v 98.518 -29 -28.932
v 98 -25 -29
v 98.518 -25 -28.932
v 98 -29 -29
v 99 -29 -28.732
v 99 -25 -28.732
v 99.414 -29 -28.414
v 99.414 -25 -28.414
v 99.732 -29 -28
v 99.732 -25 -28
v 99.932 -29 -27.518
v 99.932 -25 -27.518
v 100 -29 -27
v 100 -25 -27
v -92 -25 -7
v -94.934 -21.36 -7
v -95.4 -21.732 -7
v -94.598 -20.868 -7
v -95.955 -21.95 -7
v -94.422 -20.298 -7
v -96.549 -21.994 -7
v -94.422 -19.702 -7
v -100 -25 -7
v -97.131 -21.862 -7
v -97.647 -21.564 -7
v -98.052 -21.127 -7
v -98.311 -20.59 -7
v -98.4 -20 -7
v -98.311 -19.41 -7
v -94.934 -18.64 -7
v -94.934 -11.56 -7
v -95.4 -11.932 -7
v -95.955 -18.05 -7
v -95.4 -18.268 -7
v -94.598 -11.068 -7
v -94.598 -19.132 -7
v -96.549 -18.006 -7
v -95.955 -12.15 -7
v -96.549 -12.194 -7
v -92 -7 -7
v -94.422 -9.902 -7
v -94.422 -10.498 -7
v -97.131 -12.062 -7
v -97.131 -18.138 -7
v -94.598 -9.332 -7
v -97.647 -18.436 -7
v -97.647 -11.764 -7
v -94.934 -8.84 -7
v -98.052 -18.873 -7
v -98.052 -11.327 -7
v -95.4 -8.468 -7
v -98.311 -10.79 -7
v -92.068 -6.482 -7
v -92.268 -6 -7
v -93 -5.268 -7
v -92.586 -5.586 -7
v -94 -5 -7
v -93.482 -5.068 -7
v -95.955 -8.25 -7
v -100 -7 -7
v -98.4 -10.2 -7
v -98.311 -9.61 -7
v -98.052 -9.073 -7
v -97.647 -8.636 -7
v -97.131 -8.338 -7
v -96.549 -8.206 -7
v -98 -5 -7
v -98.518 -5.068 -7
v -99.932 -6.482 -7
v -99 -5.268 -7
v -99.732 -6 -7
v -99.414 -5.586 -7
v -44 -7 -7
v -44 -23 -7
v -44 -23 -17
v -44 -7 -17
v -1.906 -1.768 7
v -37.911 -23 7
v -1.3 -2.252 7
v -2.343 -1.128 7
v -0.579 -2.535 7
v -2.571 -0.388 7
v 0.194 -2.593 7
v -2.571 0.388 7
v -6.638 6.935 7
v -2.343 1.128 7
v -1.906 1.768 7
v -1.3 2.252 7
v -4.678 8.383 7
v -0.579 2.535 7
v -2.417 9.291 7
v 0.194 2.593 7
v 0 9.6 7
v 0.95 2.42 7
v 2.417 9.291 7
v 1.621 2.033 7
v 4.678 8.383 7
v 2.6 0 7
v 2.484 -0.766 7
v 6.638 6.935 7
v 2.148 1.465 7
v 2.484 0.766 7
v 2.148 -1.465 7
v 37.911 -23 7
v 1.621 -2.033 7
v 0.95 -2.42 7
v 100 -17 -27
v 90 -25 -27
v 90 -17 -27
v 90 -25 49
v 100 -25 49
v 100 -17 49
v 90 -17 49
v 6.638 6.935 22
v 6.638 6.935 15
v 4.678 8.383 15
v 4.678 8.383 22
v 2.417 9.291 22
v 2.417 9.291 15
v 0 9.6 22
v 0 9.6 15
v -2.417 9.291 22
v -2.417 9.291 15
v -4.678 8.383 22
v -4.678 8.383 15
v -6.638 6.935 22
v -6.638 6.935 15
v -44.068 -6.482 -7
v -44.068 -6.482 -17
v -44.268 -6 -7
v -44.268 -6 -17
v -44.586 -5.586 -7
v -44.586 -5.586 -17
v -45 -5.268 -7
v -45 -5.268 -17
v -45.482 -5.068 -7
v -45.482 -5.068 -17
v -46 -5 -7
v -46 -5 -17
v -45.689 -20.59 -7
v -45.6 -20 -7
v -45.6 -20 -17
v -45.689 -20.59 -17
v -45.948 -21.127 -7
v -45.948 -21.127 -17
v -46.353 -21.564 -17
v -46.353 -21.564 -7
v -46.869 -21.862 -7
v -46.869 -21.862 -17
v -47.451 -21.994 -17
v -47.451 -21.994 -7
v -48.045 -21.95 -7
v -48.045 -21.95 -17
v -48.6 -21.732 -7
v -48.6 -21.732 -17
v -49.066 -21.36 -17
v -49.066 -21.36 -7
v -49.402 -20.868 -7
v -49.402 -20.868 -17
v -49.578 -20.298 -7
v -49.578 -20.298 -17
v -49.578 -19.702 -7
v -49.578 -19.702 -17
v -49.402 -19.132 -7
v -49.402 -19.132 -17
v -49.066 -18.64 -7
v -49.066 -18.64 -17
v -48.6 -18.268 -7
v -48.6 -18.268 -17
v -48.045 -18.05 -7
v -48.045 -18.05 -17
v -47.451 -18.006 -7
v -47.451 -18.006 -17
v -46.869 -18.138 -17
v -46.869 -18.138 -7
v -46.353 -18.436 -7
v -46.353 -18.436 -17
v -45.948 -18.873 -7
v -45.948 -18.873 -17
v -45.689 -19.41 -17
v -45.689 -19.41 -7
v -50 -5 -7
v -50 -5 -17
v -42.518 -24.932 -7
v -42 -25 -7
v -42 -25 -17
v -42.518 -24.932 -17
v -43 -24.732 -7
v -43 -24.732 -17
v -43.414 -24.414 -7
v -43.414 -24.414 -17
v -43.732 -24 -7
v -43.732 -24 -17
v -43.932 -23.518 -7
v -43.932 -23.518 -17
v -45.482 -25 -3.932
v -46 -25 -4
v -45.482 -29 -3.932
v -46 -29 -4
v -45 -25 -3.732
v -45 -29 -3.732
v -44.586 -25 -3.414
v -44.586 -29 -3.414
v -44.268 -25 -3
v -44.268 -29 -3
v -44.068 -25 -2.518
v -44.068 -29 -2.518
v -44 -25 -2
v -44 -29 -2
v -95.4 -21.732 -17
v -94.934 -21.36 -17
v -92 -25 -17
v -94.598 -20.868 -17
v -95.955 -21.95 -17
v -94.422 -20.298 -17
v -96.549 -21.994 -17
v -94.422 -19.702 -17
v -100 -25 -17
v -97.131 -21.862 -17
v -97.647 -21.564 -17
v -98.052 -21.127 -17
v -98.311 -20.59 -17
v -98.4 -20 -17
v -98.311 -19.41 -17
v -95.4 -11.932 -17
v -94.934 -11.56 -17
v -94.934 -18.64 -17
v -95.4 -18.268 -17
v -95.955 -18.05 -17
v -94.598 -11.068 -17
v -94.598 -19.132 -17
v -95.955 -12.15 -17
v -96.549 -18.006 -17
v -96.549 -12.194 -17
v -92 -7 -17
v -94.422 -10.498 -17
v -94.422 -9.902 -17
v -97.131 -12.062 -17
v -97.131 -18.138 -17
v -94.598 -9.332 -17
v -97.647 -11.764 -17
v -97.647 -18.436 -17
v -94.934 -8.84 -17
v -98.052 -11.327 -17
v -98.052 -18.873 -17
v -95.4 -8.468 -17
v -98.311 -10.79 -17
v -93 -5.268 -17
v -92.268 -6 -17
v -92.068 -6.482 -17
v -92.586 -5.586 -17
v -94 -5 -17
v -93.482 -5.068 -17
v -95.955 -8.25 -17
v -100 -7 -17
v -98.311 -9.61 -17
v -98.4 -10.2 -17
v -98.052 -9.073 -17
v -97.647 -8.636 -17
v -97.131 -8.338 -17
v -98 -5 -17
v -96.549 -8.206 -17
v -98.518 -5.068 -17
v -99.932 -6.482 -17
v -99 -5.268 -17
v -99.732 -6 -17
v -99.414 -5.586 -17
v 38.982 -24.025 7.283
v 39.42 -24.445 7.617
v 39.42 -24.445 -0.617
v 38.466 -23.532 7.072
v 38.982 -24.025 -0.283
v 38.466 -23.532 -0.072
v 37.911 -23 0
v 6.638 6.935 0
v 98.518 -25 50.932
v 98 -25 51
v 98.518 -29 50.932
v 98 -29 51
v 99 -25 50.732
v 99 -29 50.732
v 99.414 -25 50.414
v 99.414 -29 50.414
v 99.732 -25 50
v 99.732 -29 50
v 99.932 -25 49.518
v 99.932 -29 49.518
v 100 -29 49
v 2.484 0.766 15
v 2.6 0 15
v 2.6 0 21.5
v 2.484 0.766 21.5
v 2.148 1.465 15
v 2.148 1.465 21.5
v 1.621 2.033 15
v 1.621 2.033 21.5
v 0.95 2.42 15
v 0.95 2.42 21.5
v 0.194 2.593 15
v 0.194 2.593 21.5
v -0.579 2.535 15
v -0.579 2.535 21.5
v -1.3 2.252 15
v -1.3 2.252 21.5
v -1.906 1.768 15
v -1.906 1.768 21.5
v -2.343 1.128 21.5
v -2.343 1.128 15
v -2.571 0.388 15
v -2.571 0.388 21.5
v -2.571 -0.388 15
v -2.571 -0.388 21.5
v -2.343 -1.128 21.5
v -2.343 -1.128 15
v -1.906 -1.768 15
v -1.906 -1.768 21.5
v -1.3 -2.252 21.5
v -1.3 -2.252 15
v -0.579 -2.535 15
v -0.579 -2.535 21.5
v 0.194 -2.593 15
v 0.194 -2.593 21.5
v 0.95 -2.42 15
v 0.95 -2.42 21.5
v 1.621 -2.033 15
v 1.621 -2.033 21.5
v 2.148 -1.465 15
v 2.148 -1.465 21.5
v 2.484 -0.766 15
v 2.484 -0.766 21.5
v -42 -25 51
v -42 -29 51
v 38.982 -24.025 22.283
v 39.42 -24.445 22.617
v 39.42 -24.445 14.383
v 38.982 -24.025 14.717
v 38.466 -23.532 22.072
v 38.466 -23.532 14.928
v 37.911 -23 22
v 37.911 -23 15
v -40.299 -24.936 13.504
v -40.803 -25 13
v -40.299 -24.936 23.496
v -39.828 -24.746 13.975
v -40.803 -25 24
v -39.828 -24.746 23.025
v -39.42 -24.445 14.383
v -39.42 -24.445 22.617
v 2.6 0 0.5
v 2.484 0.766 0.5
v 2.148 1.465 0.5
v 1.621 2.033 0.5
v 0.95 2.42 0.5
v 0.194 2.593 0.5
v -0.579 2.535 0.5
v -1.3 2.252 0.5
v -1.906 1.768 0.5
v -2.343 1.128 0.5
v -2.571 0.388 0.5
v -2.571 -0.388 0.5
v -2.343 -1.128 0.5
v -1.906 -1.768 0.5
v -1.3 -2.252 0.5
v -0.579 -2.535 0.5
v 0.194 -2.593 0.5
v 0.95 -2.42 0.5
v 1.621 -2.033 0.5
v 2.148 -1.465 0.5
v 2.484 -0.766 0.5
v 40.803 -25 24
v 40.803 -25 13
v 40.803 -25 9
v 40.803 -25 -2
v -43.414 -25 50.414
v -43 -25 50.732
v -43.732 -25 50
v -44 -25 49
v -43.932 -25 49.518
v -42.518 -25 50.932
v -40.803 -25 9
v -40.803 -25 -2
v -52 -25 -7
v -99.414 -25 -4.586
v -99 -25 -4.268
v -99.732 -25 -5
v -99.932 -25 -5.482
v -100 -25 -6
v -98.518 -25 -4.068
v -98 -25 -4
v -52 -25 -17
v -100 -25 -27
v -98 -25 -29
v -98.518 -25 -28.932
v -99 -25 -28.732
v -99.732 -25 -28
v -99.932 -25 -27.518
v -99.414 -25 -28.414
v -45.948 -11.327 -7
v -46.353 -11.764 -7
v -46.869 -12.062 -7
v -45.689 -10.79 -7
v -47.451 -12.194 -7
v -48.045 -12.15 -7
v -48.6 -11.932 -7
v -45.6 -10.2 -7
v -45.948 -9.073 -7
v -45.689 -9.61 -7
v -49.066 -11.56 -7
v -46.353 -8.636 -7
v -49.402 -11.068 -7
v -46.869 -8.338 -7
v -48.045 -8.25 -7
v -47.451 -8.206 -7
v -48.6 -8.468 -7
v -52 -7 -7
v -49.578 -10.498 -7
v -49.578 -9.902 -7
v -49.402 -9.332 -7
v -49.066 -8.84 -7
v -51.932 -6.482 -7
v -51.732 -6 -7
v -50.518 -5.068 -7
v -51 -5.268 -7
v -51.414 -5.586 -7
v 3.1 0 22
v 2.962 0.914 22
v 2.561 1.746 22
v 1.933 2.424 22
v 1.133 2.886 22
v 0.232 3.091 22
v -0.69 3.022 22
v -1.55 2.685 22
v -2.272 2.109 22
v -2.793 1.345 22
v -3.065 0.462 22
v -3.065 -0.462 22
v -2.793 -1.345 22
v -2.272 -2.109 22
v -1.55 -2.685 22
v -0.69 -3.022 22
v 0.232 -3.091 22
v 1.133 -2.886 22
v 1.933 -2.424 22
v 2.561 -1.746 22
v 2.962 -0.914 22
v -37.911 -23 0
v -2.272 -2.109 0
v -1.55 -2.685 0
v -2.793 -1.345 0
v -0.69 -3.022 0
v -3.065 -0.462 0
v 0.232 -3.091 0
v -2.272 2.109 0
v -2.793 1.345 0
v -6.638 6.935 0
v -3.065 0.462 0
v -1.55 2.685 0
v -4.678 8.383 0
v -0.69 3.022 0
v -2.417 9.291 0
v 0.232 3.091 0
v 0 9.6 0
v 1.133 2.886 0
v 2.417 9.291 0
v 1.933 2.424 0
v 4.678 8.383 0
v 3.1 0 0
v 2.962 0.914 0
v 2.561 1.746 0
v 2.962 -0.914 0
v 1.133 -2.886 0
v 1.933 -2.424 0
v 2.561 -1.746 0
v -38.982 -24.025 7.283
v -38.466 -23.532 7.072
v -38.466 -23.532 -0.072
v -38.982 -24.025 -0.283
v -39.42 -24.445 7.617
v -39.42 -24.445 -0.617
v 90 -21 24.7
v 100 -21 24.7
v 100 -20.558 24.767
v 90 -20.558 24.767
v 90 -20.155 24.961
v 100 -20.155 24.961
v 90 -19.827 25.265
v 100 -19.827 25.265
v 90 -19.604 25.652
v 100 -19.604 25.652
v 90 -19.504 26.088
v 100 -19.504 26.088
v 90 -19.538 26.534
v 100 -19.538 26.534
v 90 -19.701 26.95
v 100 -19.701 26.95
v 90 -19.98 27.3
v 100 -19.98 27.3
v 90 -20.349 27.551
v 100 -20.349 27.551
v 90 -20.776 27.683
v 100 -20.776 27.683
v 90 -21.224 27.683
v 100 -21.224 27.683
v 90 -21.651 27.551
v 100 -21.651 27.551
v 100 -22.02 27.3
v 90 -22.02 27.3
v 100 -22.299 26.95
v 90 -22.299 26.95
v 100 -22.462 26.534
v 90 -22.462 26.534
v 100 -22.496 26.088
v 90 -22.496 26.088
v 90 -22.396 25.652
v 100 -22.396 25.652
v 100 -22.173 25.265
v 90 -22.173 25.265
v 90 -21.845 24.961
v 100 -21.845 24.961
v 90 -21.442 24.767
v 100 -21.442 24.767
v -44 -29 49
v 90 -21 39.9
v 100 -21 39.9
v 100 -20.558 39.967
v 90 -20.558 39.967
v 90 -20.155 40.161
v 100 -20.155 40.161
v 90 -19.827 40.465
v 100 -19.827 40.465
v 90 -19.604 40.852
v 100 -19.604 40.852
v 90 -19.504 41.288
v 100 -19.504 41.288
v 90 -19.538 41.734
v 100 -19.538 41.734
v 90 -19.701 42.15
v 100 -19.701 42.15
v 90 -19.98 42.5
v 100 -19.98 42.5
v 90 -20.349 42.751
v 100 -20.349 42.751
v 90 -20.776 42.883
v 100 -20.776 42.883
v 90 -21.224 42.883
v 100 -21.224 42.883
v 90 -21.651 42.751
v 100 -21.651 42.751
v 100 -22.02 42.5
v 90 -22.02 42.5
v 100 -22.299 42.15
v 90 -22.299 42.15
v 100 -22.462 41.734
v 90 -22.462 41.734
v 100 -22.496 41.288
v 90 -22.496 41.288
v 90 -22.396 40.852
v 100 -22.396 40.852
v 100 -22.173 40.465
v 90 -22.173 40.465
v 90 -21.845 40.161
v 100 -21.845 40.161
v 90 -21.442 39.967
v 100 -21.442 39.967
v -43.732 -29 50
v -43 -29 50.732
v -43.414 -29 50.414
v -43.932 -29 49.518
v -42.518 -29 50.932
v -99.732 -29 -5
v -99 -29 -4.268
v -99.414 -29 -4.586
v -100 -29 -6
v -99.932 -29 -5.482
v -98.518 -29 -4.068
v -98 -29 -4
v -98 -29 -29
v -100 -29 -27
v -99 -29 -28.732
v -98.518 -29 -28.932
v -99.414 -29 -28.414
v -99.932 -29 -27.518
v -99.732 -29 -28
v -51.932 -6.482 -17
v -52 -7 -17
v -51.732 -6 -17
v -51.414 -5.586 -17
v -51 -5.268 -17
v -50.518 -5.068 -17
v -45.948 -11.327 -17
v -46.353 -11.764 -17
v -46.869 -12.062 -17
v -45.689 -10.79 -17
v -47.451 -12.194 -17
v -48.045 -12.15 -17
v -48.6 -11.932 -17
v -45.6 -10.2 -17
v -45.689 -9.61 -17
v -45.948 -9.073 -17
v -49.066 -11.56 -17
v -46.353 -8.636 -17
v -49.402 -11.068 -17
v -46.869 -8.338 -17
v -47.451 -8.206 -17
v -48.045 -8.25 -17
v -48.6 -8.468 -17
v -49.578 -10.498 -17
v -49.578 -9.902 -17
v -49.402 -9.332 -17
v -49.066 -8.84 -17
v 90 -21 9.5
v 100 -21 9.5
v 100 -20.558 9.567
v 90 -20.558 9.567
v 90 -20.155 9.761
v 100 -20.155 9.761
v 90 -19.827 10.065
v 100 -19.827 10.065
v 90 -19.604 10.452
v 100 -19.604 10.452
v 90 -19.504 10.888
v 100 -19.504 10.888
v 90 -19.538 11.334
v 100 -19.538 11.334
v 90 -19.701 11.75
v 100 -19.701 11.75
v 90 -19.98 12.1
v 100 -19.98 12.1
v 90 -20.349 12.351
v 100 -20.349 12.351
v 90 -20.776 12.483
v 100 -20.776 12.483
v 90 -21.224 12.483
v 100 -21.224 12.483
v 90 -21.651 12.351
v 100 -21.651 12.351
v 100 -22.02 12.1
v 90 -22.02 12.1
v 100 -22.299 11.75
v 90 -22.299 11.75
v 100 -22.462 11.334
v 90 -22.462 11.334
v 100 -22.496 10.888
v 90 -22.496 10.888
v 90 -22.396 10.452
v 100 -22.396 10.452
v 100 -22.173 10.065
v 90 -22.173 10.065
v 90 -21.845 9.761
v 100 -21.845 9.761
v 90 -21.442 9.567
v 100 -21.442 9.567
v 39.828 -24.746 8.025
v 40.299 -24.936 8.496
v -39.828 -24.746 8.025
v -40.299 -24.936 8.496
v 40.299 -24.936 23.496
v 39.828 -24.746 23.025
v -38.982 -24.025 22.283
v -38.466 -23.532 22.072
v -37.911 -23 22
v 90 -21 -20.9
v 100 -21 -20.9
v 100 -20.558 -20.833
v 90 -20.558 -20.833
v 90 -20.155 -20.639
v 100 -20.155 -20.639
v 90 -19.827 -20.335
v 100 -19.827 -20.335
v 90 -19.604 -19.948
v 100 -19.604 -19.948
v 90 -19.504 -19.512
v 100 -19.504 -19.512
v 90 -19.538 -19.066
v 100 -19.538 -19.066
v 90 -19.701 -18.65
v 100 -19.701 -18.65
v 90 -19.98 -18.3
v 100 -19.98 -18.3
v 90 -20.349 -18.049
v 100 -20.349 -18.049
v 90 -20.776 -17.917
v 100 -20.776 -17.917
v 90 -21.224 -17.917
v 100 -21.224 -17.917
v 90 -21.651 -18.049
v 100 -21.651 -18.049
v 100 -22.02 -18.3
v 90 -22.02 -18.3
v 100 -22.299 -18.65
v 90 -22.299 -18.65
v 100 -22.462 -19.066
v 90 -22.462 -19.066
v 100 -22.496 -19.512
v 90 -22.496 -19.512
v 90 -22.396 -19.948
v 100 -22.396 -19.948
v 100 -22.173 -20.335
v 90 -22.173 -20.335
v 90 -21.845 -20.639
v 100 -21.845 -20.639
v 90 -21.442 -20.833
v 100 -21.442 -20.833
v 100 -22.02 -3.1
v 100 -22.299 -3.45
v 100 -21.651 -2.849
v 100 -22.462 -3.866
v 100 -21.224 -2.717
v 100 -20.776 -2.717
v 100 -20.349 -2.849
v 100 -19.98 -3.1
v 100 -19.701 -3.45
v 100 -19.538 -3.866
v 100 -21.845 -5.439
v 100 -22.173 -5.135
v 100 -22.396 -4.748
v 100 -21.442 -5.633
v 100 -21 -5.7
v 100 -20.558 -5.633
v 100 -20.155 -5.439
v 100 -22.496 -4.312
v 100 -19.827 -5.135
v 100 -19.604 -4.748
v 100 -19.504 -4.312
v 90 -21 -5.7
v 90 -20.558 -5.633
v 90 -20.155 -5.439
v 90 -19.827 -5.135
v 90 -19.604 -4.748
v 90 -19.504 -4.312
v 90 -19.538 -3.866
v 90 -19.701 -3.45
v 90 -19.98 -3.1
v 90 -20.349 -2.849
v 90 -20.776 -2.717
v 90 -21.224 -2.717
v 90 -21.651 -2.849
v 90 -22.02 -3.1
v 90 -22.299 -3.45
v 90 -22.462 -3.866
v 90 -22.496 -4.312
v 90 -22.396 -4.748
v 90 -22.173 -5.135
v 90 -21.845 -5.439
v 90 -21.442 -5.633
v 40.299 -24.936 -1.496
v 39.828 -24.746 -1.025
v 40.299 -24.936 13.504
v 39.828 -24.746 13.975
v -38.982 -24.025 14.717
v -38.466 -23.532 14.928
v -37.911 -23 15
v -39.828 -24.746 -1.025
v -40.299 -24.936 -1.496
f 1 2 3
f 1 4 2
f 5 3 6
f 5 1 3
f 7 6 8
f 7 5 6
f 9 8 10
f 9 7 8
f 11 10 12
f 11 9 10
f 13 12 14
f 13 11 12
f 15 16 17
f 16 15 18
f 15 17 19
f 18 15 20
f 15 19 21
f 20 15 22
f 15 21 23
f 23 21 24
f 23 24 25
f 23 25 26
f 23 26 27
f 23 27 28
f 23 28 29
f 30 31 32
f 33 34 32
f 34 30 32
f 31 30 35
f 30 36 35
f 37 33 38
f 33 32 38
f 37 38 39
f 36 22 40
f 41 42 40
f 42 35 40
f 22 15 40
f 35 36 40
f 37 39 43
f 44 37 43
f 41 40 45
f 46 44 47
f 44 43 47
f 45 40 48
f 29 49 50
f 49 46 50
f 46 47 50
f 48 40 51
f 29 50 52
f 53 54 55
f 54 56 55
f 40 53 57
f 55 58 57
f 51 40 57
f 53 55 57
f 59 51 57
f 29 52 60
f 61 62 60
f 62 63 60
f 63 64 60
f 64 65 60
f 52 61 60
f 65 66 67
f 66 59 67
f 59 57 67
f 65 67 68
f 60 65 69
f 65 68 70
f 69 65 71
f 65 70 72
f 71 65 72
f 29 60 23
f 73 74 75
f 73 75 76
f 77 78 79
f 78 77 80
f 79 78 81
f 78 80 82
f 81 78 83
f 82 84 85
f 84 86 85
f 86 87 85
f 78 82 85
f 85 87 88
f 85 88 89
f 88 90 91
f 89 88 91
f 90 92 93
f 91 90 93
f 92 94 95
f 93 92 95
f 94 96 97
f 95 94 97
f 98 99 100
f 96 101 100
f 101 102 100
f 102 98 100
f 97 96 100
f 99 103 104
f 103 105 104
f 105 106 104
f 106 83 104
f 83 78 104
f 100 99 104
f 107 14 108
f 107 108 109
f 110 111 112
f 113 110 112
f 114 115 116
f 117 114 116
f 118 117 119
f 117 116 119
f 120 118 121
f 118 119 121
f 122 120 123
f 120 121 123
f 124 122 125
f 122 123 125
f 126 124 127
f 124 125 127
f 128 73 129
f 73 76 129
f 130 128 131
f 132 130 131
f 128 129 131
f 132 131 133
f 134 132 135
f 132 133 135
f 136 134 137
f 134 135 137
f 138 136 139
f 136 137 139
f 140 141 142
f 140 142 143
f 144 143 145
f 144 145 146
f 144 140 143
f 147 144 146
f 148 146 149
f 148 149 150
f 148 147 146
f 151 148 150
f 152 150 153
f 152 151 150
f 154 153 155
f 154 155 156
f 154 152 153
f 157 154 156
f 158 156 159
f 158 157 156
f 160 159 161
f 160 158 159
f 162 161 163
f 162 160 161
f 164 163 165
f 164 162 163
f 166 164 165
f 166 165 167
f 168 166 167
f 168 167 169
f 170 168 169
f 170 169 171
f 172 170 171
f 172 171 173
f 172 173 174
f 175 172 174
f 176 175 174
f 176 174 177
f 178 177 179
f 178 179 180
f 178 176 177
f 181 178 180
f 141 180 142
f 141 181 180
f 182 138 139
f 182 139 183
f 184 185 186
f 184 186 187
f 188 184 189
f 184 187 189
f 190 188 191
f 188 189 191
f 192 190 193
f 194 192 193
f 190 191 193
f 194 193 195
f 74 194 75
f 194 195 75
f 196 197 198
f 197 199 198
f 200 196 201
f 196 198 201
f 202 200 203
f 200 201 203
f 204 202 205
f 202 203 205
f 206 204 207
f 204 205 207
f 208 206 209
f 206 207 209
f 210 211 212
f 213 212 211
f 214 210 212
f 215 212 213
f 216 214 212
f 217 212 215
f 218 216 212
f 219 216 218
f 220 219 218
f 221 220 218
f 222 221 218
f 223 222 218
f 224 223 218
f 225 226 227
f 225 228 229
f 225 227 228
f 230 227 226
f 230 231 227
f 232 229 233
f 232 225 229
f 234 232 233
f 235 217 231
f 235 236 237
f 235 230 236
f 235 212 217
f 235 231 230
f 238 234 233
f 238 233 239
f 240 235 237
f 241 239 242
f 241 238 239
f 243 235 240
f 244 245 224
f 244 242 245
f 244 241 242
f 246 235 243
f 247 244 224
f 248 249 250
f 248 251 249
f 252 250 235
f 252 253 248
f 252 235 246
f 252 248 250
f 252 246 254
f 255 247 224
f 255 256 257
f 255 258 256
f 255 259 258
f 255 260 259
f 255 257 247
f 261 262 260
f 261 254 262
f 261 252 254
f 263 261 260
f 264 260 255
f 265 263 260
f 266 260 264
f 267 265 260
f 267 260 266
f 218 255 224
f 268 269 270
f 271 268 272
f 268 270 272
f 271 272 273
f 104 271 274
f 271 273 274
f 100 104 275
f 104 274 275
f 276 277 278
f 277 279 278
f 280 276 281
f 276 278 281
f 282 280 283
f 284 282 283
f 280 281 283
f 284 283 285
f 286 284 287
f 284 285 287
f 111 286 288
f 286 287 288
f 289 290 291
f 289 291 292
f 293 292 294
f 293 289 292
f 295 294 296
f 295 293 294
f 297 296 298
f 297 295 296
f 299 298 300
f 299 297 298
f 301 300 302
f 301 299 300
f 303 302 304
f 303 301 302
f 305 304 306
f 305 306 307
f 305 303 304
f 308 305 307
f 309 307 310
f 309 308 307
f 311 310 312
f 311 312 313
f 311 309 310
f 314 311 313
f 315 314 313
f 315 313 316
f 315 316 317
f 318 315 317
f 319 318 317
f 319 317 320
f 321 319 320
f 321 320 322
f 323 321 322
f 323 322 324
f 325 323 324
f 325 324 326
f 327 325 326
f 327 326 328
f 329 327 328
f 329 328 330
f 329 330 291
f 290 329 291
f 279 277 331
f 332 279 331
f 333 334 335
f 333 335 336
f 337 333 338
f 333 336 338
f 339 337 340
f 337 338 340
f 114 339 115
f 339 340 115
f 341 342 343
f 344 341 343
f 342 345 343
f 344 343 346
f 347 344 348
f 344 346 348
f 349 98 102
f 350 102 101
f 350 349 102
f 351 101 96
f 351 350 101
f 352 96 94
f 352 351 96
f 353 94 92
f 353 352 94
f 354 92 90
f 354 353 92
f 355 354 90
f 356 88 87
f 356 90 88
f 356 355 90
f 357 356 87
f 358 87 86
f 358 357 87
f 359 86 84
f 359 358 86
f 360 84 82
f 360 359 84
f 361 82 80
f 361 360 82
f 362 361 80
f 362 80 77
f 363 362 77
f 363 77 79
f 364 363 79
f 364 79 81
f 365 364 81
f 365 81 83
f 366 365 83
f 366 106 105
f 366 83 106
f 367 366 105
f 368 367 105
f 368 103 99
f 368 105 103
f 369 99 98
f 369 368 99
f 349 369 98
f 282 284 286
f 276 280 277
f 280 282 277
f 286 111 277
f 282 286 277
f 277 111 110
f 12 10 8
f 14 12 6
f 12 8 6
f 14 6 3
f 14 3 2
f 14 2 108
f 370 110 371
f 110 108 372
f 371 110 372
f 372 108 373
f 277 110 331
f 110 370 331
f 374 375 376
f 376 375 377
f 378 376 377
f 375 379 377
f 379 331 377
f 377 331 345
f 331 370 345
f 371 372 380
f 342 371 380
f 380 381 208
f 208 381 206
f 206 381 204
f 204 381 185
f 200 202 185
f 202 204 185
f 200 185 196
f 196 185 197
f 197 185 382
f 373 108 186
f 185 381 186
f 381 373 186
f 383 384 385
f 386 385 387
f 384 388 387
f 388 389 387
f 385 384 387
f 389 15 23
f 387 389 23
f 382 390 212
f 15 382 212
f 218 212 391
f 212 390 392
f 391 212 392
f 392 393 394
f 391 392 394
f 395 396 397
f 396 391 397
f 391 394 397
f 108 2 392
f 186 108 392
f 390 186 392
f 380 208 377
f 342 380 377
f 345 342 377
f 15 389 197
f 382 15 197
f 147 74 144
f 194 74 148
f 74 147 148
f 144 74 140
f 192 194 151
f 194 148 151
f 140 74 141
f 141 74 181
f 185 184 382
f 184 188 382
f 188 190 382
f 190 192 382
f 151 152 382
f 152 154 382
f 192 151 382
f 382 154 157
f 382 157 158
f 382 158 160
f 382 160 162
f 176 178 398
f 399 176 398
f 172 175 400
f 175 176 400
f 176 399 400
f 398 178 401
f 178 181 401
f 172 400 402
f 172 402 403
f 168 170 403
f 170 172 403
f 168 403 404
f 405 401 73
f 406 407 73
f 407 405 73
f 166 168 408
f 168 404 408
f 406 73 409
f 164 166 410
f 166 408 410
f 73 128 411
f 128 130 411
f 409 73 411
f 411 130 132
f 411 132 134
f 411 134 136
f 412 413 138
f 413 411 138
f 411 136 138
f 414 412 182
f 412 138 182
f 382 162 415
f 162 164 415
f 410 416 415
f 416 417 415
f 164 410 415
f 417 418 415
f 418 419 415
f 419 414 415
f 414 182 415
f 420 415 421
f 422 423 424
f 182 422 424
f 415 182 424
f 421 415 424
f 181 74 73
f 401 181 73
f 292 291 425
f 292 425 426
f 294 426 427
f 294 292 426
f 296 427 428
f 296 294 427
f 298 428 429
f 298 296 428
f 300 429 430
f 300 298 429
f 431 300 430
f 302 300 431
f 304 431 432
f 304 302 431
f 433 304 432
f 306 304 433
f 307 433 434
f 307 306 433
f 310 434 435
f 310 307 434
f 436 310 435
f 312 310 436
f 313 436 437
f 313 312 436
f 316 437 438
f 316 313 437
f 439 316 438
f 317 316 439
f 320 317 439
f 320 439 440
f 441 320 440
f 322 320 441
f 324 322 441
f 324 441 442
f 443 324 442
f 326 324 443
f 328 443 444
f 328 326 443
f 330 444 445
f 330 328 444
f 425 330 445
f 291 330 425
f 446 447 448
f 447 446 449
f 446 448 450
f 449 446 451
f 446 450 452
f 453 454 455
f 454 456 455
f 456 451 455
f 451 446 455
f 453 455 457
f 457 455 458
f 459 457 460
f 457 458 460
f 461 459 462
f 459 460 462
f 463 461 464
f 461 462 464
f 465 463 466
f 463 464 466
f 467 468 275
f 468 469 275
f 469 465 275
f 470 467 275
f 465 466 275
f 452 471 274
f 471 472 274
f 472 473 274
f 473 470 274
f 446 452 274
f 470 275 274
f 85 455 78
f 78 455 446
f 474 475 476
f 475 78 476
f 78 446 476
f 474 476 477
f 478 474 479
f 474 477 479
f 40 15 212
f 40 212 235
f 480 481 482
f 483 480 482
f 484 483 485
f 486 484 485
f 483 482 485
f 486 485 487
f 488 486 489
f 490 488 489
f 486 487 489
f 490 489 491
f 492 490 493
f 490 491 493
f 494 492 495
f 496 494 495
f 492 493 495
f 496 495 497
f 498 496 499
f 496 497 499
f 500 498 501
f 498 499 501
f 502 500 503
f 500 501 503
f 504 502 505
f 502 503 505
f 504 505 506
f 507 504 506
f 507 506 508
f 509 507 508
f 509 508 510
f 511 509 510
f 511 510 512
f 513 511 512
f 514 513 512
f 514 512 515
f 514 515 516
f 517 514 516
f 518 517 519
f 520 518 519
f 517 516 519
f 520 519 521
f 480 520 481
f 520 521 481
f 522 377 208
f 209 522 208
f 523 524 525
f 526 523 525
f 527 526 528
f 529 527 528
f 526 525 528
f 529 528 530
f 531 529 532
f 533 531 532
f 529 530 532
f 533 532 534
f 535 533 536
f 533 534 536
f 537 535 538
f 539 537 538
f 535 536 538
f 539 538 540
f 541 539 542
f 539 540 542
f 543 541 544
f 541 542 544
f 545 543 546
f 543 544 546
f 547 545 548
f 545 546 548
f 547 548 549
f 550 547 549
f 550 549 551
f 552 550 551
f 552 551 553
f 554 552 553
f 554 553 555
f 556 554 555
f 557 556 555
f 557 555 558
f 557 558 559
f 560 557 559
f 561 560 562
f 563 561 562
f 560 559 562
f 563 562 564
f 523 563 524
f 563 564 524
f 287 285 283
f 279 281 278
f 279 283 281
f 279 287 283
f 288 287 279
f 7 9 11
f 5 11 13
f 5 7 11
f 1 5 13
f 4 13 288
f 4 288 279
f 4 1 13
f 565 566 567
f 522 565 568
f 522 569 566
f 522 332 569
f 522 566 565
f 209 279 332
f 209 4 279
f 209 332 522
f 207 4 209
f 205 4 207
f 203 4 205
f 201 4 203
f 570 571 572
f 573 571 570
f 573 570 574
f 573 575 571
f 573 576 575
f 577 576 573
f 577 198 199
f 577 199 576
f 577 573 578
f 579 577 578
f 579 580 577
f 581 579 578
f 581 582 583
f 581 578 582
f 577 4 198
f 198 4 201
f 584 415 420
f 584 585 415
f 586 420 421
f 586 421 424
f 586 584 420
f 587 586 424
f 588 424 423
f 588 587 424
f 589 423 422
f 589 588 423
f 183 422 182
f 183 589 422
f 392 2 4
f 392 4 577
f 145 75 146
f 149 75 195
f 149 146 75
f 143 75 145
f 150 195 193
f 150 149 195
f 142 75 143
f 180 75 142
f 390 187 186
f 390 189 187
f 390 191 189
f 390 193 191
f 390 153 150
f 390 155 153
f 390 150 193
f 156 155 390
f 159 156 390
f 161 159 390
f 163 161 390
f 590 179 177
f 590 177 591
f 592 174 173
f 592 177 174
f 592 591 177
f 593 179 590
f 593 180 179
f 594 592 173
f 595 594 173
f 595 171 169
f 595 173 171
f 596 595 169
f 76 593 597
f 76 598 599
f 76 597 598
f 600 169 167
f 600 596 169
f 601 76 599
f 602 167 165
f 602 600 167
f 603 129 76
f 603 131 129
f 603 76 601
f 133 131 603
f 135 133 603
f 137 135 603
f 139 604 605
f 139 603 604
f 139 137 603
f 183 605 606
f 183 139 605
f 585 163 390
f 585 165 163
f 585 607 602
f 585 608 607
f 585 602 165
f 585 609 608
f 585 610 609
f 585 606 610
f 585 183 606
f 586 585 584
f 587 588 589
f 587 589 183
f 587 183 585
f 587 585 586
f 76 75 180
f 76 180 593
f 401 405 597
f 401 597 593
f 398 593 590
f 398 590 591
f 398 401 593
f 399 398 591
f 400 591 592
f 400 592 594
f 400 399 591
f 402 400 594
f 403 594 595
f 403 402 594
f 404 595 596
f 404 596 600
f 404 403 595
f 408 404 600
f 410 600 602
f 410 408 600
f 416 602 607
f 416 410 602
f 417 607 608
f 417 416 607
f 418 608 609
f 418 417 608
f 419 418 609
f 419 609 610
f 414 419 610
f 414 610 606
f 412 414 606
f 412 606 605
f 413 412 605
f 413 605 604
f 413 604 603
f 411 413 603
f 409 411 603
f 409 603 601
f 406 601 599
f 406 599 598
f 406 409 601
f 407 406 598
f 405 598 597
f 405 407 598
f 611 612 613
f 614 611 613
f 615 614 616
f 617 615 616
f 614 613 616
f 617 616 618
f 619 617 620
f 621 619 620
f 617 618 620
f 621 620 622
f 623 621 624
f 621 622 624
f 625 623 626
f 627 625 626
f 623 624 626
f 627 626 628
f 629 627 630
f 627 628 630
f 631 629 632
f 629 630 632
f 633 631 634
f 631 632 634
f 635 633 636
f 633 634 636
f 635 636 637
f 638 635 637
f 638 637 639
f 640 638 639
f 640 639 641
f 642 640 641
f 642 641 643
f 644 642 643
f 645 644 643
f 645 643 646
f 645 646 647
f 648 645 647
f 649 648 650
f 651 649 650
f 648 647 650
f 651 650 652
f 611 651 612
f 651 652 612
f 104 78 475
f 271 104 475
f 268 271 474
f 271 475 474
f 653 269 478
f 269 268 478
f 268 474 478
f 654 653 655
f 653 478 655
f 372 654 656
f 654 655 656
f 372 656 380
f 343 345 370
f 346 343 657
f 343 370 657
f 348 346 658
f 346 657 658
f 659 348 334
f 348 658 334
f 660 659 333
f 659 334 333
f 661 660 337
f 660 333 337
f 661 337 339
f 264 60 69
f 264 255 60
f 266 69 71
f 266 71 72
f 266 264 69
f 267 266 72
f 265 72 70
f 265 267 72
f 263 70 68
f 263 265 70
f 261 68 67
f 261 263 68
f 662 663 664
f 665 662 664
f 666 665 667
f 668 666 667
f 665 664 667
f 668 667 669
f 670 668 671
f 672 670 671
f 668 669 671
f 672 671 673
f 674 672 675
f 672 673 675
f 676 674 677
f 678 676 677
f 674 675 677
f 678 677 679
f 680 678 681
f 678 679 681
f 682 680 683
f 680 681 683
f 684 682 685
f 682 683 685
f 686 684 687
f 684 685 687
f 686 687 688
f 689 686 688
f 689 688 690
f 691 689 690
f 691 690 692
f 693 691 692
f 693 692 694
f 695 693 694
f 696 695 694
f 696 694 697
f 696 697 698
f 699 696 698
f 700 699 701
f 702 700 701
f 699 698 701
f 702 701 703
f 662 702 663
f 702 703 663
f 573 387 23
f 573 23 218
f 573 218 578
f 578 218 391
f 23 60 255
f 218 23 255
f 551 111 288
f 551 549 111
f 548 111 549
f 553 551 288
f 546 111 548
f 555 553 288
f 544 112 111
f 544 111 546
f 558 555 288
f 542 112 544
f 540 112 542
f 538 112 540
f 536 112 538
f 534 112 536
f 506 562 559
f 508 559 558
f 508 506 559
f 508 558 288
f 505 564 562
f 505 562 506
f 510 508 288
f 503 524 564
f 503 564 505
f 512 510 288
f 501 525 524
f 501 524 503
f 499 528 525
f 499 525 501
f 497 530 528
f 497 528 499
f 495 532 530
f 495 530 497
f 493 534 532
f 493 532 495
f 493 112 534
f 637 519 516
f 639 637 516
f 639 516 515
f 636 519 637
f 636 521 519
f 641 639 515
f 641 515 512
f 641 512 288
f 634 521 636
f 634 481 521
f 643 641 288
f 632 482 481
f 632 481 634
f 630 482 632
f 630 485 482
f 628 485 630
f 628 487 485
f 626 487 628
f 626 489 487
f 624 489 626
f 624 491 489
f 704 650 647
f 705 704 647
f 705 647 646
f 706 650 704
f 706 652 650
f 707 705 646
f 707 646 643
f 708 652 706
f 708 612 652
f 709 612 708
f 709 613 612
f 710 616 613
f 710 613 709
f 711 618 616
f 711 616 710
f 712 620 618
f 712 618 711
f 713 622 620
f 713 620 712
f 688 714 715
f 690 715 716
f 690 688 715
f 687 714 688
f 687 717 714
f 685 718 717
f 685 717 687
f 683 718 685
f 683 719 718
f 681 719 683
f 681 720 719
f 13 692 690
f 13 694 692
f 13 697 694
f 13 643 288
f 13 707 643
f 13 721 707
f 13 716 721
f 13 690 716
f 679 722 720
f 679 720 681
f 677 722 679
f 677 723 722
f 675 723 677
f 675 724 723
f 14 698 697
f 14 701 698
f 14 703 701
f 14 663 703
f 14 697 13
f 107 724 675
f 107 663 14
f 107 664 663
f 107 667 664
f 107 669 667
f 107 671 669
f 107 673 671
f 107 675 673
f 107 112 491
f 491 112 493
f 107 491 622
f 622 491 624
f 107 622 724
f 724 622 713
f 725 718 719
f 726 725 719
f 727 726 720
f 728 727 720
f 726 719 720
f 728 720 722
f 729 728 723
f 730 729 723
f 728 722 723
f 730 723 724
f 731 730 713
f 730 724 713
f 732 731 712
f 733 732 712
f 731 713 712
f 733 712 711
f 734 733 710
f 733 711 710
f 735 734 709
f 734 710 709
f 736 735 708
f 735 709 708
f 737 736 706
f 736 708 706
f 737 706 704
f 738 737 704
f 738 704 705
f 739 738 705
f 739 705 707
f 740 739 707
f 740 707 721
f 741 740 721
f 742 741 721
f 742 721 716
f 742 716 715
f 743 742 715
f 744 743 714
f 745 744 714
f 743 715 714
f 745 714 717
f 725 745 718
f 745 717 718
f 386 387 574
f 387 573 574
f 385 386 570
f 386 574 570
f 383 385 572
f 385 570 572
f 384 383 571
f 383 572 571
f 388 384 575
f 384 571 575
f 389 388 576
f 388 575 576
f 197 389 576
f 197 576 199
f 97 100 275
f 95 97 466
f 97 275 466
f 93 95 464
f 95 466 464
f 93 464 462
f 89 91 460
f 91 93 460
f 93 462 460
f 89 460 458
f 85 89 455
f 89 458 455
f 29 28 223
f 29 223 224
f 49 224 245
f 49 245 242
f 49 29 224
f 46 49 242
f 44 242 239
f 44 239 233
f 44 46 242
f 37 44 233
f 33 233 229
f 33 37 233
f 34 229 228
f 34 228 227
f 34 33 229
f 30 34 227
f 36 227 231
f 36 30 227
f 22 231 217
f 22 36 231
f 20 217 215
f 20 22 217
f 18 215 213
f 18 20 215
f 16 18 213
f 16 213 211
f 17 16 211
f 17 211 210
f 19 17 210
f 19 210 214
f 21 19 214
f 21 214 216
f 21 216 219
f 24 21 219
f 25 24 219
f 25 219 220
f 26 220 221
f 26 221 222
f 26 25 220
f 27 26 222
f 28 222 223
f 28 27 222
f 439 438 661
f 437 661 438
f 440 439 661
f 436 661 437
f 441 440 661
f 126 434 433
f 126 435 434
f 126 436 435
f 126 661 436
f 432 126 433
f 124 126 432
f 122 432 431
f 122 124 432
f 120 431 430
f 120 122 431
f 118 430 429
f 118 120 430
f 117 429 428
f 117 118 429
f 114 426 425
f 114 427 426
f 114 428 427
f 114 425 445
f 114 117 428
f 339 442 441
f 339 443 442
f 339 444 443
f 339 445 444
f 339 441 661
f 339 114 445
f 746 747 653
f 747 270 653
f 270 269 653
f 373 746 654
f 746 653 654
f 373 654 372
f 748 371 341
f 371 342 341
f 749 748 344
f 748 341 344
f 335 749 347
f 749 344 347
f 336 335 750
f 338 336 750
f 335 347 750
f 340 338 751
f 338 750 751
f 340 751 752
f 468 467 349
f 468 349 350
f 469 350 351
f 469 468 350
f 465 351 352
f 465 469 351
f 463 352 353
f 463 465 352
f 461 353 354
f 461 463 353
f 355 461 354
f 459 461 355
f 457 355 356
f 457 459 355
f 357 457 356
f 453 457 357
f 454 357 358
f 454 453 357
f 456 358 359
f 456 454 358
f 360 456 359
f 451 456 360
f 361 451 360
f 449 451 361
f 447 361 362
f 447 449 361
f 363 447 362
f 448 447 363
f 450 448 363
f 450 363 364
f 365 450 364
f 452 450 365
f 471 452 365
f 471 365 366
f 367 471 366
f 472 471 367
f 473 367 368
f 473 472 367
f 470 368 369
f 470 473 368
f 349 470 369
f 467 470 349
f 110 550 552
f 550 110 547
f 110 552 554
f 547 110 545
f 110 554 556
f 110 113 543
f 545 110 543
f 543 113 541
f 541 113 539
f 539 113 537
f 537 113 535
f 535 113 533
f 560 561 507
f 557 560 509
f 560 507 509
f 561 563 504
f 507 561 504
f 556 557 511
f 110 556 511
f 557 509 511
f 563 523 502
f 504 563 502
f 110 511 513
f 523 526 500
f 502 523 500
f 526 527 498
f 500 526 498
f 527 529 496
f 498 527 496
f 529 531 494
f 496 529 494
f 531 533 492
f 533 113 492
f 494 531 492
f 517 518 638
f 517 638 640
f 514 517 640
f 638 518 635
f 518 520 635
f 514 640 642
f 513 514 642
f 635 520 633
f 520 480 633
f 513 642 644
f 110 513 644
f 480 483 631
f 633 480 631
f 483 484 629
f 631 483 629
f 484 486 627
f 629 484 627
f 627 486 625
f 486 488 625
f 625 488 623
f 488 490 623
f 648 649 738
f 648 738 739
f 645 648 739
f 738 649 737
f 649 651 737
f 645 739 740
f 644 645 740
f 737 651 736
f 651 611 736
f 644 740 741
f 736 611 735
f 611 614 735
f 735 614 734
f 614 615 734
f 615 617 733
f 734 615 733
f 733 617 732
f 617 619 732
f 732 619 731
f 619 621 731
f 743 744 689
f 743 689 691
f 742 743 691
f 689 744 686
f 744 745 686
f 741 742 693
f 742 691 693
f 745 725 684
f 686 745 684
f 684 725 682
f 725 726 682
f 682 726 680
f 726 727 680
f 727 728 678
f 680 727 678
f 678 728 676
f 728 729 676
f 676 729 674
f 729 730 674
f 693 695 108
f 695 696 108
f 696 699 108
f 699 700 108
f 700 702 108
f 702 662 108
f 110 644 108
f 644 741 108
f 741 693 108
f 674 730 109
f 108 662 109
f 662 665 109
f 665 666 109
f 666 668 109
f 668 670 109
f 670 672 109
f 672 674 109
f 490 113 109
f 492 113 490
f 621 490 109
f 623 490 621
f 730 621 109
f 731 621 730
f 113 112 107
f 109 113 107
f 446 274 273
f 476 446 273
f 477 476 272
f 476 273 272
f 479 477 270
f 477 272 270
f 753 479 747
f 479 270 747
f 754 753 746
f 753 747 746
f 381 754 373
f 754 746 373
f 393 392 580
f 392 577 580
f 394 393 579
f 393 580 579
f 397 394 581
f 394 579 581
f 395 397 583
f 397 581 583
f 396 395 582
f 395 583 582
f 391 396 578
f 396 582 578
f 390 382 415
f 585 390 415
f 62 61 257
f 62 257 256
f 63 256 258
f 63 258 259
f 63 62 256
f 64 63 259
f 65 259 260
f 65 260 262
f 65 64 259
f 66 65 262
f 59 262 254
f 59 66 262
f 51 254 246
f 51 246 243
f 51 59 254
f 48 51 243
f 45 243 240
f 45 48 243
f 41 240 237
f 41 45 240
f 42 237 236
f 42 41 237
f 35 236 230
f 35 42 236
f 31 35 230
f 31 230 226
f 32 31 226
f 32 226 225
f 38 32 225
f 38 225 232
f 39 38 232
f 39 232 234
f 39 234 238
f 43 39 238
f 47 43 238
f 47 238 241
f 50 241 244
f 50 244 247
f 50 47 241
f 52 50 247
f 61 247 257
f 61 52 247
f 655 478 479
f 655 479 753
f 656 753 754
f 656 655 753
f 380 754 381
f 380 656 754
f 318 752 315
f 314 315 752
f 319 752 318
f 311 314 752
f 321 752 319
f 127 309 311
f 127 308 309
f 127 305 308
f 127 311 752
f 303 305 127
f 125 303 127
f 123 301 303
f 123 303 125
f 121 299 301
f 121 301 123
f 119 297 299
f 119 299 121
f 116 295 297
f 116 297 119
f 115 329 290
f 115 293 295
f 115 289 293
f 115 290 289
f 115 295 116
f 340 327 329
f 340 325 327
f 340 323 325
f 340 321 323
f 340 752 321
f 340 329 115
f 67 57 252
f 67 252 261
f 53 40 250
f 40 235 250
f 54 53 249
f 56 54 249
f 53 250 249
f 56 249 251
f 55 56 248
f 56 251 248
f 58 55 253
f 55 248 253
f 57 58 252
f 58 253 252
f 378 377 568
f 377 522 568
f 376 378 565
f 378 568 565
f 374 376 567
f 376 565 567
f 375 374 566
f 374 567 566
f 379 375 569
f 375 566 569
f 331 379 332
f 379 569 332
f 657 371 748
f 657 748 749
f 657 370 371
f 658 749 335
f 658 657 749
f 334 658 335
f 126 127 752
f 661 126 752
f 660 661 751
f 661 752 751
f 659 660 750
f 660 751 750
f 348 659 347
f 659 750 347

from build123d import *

# Parameters (mm, degrees)
SKETCH1_R           = 2.6
BOSS_EXTRUDE1_DEPTH = 22
SKETCH2_W           = 200
SKETCH2_H           = 80
BOSS_EXTRUDE2_DEPTH = 4
SKETCH3_W           = 8
SKETCH3_H           = 35
CUT_EXTRUDE1_DEPTH  = 209.42744541
CHAMFER1_SIZE       = 0.5
BOSS_EXTRUDE3_START = -22
SKETCH4_W           = 8
SKETCH4_H           = 20
SKETCH4_R           = 2
BOSS_EXTRUDE3_DEPTH = 10
SKETCH5_W           = 56
SKETCH5_H           = 55
CUT_EXTRUDE2_DEPTH  = 7
FILLET1_R           = 2
SKETCH7_W           = 76
SKETCH7_H           = 8
SKETCH7_R           = 1.5
BOSS_EXTRUDE4_DEPTH = 10


with BuildPart() as part:
    # Sketch1 → Boss-Extrude1 (new body)
    with BuildSketch(Plane.XY):
        with BuildLine():
            Line((-6.63831163, 6.934898608), (-40, -25))
            Line((-40, -25), (40, -25))
            Line((40, -25), (6.63831163, 6.934898608))
            ThreePointArc((6.63831163, 6.934898608), (0, 9.6), (-6.63831163, 6.934898608))
        make_face()
        Circle(SKETCH1_R, mode=Mode.SUBTRACT)
    extrude(amount=BOSS_EXTRUDE1_DEPTH)

    # Sketch2 → Boss-Extrude2 (add)
    with BuildSketch(Plane(origin=(0, -25, 0), x_dir=(-1, 0, 0), z_dir=(0, -1, 0))):
        with Locations((0, -11)):
            Rectangle(SKETCH2_W, SKETCH2_H)
    extrude(amount=BOSS_EXTRUDE2_DEPTH)

    # Sketch3 → Cut-Extrude1 (cut, through all)
    with BuildSketch(Plane(origin=(100, 0, 0), x_dir=(0, 0, -1), z_dir=(1, 0, 0))):
        with Locations((-11, -7.5)):
            Rectangle(SKETCH3_W, SKETCH3_H)
    extrude(amount=-CUT_EXTRUDE1_DEPTH, mode=Mode.SUBTRACT)

    # Chamfer1
    chamfer1_edges = [part.edges().sort_by_distance(p)[0] for p in [
        (-2.6, 0, 0),
        (-2.6, 0, 22),
    ]]
    chamfer(chamfer1_edges, length=CHAMFER1_SIZE)

    # Sketch4 → Boss-Extrude3 (add)
    # profile 1 of 2: a face of its own
    with BuildSketch(Plane(origin=(0, 0, -29), x_dir=(-1, 0, 0), z_dir=(0, 0, -1)).offset(BOSS_EXTRUDE3_START)):
        with Locations((96, -15)):
            Rectangle(SKETCH4_W, SKETCH4_H)
        with Locations((96.4, -20)):
            Circle(SKETCH4_R, mode=Mode.SUBTRACT)
        with Locations((96.4, -10.2)):
            Circle(SKETCH4_R, mode=Mode.SUBTRACT)
    # profile 2 of 2: a face of its own
    with BuildSketch(Plane(origin=(0, 0, -29), x_dir=(-1, 0, 0), z_dir=(0, 0, -1)).offset(BOSS_EXTRUDE3_START)):
        with Locations((48, -15)):
            Rectangle(SKETCH4_W, SKETCH4_H)
        with Locations(Location((47.6, -20, 0), (0, 0, 180))):
            Circle(SKETCH4_R, mode=Mode.SUBTRACT)
        with Locations(Location((47.6, -10.2, 0), (0, 0, 180))):
            Circle(SKETCH4_R, mode=Mode.SUBTRACT)
    extrude(amount=BOSS_EXTRUDE3_DEPTH)

    # Sketch5 → Cut-Extrude2 (cut)
    with BuildSketch(Plane(origin=(0, -25, 0), x_dir=(1, 0, 0), z_dir=(0, 1, 0))):
        with Locations((-72, -23.5)):
            Rectangle(SKETCH5_W, SKETCH5_H)
    extrude(amount=-CUT_EXTRUDE2_DEPTH, mode=Mode.SUBTRACT)

    # Fillet1
    fillet1_edges = [part.edges().sort_by_distance(p)[0] for p in [
        (-100, -5, -12),
        (-92, -5, -12),
        (-44, -5, -12),
        (-52, -5, -12),
        (-44, -25, -12),
        (0, -25, 0),
        (0, -25, 15),
        (-40, -25, 18.5),
        (0, -25, 7),
        (-40, -25, 3.5),
        (0, -25, 22),
        (40, -25, 3.5),
        (40, -25, 18.5),
        (100, -27, -29),
        (100, -27, 51),
        (-100, -27, -29),
        (-44, -27, -4),
        (-44, -27, 51),
        (-100, -27, -4),
    ]]
    fillet(fillet1_edges, radius=FILLET1_R)

    # Sketch7 → Boss-Extrude4 (add)
    with BuildSketch(Plane(origin=(100, 0, 0), x_dir=(0, 0, -1), z_dir=(1, 0, 0))):
        with Locations((-11, -21)):
            Rectangle(SKETCH7_W, SKETCH7_H)
        with Locations((-41.4, -21)):
            Circle(SKETCH7_R, mode=Mode.SUBTRACT)
        with Locations((-26.2, -21)):
            Circle(SKETCH7_R, mode=Mode.SUBTRACT)
        with Locations((-11, -21)):
            Circle(SKETCH7_R, mode=Mode.SUBTRACT)
        with Locations((4.2, -21)):
            Circle(SKETCH7_R, mode=Mode.SUBTRACT)
        with Locations((19.4, -21)):
            Circle(SKETCH7_R, mode=Mode.SUBTRACT)
    extrude(amount=-BOSS_EXTRUDE4_DEPTH)


solid = part.part
